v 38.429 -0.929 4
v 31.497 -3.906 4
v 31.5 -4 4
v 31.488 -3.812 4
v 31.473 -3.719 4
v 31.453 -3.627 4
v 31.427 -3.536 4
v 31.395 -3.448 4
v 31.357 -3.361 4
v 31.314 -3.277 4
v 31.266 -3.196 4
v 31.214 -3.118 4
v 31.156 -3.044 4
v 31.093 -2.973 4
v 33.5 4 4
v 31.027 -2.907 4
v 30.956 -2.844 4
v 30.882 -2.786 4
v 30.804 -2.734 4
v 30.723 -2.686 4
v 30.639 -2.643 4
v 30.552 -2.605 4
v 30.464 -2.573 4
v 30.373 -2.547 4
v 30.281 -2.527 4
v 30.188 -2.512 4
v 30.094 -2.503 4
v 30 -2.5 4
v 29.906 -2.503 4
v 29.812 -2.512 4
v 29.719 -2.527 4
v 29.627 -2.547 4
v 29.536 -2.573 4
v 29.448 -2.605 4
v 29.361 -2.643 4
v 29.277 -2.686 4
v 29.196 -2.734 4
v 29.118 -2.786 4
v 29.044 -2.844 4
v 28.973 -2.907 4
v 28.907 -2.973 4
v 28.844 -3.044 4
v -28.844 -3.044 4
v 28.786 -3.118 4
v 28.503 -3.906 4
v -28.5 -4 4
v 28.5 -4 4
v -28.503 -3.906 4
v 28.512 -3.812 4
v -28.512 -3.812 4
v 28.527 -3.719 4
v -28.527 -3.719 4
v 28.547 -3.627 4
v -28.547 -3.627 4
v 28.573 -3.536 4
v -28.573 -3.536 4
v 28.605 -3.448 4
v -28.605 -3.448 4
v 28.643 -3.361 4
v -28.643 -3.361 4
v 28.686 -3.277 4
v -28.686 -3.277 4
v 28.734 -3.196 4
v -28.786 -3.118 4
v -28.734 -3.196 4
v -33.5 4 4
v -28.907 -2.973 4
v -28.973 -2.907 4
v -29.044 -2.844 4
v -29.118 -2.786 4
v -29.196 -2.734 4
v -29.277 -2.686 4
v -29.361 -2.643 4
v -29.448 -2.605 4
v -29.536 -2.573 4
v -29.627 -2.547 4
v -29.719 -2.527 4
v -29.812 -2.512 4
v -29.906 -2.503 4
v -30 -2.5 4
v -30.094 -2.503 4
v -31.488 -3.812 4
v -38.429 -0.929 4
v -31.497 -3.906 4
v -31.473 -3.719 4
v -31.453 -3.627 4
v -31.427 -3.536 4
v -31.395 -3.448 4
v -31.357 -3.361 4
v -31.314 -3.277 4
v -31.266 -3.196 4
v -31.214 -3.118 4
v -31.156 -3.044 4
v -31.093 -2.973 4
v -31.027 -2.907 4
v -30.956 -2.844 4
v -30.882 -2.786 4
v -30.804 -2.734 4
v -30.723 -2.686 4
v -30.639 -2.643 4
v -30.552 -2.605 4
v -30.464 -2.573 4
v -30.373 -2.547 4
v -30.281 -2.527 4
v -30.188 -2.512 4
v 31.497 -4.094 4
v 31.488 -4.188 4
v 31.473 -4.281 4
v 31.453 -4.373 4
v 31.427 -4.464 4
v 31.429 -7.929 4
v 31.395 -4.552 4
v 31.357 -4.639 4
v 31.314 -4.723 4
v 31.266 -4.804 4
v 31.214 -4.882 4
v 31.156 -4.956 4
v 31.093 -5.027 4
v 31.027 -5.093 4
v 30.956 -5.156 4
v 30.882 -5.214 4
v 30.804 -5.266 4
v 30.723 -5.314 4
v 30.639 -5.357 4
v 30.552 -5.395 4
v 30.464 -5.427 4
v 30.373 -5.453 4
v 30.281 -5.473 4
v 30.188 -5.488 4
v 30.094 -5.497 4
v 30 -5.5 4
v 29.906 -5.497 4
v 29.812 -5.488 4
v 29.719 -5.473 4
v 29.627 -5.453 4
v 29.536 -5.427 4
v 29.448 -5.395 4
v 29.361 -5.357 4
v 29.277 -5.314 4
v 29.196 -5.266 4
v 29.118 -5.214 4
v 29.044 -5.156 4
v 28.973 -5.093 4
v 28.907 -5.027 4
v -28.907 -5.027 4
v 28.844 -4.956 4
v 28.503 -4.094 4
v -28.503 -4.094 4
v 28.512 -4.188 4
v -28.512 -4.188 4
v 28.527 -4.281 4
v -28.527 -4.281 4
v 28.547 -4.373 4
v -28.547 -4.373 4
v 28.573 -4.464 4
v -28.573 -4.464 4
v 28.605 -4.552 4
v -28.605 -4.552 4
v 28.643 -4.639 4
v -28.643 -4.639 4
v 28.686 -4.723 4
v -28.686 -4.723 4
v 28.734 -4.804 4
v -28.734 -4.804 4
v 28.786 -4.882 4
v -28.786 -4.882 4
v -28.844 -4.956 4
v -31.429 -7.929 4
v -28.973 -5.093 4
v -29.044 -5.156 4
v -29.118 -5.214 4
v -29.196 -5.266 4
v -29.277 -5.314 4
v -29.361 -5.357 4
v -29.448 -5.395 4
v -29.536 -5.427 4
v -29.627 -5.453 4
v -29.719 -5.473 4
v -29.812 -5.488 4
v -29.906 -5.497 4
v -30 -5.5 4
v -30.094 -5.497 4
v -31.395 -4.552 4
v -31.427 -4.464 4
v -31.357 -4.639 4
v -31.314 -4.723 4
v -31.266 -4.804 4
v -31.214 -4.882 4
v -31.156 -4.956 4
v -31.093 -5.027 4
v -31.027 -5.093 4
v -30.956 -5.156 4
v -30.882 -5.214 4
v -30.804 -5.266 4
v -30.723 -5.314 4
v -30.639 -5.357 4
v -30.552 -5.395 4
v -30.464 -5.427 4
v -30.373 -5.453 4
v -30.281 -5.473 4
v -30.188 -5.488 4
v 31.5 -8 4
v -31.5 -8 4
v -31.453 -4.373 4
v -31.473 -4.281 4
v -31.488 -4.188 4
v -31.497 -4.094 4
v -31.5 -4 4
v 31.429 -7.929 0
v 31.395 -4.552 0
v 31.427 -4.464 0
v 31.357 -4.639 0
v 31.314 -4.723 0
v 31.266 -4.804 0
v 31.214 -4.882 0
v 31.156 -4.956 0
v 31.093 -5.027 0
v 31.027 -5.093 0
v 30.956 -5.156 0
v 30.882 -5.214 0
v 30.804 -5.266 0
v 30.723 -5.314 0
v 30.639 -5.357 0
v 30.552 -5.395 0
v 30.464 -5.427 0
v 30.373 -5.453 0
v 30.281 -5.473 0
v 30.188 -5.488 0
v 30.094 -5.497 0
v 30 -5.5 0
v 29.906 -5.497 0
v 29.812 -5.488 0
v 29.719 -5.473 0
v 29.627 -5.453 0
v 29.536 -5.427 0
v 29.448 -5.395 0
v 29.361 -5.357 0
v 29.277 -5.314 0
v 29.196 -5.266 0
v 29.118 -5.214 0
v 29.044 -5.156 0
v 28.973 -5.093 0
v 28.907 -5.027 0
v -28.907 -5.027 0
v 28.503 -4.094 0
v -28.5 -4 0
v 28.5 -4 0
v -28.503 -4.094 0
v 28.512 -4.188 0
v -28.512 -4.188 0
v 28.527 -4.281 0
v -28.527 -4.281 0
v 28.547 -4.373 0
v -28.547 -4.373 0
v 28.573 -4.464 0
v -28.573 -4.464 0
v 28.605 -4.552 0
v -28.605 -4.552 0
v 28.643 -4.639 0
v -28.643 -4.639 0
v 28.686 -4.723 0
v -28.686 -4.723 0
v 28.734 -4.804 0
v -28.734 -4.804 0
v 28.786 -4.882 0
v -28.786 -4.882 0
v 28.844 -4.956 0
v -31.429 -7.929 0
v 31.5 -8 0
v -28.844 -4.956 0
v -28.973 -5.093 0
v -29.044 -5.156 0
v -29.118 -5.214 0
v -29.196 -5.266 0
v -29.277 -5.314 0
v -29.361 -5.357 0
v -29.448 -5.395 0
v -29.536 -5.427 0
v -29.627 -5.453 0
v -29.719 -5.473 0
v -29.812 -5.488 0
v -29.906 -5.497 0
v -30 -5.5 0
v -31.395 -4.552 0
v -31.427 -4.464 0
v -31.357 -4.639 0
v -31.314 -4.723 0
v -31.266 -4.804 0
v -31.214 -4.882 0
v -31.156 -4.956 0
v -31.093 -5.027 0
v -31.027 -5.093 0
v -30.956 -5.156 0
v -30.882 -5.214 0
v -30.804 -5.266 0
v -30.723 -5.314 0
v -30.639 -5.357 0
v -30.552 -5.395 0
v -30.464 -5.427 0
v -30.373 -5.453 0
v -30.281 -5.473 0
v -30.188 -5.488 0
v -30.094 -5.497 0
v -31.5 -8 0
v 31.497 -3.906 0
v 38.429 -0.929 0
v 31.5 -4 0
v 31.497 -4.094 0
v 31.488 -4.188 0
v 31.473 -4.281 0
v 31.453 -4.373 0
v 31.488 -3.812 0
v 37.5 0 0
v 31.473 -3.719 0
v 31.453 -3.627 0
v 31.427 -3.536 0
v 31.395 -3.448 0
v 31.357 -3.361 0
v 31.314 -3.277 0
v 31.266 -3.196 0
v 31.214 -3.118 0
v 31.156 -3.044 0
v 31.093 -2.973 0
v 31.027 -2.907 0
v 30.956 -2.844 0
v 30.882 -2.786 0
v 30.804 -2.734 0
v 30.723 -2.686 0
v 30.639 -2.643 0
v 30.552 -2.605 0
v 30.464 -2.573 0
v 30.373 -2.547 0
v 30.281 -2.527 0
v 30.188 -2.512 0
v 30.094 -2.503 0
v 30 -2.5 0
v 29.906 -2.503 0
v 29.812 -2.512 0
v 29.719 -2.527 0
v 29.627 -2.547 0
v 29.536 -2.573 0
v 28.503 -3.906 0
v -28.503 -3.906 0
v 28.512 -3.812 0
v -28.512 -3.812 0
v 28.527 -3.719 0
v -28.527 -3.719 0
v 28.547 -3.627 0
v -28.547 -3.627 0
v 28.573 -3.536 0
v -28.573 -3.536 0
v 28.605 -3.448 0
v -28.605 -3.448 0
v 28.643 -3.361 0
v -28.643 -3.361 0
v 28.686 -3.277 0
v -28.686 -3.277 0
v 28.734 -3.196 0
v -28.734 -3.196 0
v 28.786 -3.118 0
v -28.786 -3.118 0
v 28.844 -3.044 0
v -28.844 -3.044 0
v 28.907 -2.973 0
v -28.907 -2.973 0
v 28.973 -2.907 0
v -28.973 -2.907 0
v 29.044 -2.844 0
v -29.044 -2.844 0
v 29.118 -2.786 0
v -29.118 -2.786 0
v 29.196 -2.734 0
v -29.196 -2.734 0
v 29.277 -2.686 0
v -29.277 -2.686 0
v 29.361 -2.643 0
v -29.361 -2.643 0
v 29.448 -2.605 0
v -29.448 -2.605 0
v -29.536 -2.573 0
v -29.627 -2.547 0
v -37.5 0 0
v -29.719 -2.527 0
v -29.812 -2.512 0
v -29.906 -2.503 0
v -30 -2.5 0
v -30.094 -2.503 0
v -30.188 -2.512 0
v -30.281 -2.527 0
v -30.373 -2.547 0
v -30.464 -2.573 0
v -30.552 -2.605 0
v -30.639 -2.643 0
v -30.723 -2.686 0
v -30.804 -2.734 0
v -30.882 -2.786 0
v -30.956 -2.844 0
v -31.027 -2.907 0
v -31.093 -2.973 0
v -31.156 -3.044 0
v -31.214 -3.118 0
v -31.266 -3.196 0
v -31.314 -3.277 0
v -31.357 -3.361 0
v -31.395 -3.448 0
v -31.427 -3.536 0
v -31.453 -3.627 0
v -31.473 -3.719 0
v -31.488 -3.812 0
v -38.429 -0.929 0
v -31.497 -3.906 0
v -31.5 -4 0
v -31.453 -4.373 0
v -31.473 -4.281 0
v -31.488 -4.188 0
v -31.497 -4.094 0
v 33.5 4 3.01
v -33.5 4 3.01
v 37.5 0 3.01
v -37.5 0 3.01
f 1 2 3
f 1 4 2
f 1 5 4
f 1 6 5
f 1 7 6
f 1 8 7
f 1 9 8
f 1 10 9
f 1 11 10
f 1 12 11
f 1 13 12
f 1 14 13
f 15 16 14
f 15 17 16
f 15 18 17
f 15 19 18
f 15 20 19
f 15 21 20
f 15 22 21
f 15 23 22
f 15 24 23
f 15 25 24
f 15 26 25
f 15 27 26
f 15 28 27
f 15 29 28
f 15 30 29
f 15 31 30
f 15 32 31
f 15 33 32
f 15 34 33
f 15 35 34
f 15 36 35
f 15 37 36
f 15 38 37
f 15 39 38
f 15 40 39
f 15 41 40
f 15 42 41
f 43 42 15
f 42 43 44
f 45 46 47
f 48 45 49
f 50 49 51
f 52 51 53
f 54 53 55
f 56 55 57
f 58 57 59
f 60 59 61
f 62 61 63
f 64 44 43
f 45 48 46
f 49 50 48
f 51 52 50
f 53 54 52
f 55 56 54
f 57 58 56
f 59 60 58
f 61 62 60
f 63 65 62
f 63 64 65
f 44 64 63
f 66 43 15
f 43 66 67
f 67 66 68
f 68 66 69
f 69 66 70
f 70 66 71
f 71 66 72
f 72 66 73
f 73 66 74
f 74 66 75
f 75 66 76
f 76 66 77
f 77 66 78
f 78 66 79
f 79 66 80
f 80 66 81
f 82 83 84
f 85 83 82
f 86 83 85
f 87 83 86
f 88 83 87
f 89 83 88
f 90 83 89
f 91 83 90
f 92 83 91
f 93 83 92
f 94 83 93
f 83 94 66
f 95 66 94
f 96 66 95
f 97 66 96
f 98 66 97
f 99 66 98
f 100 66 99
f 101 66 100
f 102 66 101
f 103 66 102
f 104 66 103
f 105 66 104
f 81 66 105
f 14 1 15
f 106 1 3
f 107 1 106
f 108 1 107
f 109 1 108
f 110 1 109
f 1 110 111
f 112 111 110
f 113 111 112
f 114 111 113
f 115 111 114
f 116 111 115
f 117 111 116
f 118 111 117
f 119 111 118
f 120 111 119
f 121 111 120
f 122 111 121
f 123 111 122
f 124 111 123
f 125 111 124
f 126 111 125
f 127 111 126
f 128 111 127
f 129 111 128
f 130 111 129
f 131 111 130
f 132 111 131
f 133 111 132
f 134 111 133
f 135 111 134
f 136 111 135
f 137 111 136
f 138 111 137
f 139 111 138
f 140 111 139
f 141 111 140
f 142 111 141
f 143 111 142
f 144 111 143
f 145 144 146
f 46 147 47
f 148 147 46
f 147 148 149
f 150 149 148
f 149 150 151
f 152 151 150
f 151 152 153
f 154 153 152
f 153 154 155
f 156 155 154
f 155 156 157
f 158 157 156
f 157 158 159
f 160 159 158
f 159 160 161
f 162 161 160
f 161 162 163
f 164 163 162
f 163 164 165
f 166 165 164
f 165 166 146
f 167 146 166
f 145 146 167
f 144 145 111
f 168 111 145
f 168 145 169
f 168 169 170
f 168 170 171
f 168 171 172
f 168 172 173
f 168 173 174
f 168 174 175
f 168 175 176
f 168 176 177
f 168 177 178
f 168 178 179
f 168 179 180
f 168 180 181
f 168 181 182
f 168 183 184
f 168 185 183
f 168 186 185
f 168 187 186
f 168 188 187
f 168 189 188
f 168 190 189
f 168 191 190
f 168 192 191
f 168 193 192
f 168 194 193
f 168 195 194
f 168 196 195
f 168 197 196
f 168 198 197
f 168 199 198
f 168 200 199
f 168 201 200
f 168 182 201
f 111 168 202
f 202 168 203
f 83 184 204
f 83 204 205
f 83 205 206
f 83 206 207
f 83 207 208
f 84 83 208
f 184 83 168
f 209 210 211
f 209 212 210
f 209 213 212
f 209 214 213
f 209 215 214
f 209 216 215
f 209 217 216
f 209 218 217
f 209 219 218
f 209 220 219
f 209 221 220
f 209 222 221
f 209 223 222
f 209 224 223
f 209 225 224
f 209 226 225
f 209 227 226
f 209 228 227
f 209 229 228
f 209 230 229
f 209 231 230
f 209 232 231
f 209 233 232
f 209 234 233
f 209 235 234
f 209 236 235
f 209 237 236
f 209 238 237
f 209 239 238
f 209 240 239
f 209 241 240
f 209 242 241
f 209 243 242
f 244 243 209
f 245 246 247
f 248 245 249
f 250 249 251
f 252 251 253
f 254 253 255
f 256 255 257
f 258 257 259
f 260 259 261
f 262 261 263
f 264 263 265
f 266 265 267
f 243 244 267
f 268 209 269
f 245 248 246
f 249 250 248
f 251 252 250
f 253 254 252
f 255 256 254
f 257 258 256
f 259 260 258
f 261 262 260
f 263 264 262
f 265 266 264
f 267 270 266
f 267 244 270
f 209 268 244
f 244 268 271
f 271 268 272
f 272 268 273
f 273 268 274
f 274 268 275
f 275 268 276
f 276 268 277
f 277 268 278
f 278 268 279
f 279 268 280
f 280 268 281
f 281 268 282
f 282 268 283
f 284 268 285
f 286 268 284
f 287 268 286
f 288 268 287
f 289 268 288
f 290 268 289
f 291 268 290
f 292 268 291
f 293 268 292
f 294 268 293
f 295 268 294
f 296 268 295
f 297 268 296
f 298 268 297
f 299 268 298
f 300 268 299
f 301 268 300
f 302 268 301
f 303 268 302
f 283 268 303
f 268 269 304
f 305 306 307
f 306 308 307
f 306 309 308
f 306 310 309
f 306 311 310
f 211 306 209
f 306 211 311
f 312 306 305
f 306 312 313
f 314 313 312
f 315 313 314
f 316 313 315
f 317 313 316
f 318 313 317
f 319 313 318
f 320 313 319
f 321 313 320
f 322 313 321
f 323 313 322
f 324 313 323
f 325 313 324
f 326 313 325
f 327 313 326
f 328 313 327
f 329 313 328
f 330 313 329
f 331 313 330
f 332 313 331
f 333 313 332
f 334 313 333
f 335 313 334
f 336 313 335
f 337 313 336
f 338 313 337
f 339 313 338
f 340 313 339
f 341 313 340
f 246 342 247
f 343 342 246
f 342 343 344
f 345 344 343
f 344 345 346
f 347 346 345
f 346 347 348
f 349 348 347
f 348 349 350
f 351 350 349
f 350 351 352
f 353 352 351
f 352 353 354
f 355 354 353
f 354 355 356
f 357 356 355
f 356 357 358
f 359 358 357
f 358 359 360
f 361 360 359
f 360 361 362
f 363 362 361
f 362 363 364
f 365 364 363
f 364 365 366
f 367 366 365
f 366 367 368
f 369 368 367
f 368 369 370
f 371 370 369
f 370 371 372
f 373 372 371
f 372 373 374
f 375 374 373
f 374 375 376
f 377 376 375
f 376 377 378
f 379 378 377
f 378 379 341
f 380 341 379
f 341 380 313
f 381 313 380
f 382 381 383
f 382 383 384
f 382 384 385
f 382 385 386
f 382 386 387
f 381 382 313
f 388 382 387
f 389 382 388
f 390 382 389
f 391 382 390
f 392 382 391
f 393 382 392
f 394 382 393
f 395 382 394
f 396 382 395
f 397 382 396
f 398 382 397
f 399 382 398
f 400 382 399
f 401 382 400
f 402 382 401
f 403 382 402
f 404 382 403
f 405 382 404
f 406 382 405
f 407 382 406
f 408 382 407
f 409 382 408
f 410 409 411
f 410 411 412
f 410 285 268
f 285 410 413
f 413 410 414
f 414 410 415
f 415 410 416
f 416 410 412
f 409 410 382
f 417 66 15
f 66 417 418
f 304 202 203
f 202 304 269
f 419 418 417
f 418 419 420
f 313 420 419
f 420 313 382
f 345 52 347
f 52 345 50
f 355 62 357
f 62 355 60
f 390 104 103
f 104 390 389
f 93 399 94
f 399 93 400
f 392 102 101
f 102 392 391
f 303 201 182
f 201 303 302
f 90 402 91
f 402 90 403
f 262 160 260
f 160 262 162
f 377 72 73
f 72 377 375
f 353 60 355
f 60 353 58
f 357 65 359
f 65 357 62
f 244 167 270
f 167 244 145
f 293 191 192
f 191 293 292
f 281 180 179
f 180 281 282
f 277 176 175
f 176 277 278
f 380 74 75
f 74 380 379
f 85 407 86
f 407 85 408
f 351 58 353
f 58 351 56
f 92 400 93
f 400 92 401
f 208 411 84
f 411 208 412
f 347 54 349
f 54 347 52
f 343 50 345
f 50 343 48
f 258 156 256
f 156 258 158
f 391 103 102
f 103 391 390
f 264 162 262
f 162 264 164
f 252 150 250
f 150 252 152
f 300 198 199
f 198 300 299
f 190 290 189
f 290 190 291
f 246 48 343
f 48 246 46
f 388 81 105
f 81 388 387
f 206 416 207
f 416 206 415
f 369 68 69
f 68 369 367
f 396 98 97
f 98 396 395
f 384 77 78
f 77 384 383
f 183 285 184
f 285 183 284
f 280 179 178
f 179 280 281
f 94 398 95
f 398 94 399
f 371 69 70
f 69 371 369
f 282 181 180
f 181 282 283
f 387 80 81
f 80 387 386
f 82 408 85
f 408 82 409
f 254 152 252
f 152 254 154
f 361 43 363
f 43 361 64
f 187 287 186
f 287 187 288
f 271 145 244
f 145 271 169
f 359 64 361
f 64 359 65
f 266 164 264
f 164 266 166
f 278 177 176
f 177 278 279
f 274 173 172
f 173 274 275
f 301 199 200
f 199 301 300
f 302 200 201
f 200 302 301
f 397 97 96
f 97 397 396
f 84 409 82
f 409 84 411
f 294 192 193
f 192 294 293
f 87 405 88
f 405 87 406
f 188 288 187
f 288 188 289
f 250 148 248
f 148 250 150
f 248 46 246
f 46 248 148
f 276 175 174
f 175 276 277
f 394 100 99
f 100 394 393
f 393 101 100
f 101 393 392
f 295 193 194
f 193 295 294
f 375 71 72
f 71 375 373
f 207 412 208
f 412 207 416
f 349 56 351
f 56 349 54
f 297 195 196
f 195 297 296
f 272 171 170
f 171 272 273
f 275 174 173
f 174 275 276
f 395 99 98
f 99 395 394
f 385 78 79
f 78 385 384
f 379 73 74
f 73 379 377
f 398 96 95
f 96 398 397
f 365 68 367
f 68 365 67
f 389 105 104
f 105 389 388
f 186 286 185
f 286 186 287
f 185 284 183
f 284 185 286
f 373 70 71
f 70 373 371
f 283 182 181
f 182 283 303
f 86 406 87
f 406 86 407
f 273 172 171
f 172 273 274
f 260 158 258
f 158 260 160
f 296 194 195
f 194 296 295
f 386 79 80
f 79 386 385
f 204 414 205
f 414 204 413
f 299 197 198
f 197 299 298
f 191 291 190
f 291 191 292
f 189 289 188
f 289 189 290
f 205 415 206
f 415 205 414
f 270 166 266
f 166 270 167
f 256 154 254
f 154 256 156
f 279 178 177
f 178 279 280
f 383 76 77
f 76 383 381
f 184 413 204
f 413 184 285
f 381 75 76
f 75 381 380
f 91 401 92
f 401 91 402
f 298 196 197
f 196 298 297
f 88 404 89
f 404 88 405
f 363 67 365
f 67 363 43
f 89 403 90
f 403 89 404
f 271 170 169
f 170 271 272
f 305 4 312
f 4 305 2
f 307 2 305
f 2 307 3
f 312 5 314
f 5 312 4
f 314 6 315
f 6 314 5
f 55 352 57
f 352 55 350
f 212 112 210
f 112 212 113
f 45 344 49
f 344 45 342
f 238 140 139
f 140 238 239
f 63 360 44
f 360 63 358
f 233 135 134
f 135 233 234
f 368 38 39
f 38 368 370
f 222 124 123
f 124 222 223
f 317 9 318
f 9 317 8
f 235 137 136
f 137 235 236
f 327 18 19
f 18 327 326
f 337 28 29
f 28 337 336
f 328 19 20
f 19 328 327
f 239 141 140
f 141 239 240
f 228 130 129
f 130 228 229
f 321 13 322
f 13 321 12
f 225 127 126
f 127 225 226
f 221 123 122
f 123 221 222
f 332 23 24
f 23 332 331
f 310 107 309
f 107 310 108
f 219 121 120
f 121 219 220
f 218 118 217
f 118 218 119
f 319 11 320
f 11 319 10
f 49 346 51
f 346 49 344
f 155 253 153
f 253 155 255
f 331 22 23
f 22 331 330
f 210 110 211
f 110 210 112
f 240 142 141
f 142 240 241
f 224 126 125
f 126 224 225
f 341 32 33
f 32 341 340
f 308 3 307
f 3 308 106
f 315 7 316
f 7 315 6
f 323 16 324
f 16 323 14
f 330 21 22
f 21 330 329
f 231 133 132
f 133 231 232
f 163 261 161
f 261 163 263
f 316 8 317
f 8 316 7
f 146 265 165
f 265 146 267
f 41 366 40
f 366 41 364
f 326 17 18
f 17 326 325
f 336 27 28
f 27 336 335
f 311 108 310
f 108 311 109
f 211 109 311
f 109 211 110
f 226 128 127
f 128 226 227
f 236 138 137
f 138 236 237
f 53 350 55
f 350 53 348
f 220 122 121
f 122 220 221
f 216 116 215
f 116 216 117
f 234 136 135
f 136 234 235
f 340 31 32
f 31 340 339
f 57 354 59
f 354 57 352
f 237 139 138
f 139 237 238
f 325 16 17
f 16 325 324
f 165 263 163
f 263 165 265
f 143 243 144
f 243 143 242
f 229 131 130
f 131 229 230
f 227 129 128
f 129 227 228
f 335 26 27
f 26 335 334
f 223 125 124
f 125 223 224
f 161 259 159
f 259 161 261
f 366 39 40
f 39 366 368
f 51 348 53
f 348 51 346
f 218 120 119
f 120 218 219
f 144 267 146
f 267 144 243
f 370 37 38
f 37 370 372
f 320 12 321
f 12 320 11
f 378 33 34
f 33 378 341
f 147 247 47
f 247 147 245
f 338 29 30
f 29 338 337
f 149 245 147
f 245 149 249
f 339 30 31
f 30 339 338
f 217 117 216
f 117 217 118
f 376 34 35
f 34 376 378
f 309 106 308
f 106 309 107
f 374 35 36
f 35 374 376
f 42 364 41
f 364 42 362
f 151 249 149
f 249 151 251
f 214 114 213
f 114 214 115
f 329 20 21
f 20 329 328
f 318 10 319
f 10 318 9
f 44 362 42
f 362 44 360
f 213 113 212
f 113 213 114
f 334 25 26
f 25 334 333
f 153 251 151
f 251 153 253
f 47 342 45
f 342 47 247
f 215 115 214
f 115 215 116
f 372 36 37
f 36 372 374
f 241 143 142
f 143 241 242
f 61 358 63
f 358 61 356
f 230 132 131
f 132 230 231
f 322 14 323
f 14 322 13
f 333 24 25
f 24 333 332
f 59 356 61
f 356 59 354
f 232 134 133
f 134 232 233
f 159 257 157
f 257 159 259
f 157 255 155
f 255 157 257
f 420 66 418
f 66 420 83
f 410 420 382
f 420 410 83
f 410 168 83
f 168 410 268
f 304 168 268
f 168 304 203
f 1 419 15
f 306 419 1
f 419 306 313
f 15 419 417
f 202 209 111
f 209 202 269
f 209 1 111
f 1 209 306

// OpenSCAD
//
// Filter Slot for Formatt Hitech 67mm Filter
// Copyright (C) 2021 Uwe Glässner
//

// slot lengths (mm)
l = 77; // total length
l1 = 20;  // length until curve 
// slot widths (mm)
w1 = 8;
w2 = 0.0;
w3 = 4.0;
w  = w1+w2+w3;
// slot height (mm)
h1 = 1.0; // curvature thickness
cr = 80; // curvature radius
of = 0.6; // curvature offset for 2mm firecrest filters (instead of 1.4mm Resin) 
h = 4; // total height

D = 0.01; // generic overlap of parts.

module loch(posx,posy){
    union(){
       translate([posx, posy,-D]) cylinder(d=3, h=h+2*D, $fn=100);
    }
}


 difference(){
    // slot
    translate([-l/2,-w1,0]) cube([l,w,h]);
    // carve out middle slot 
    translate([-l/2+l1+D,0,-D]) cube([l-2*l1,w2,h+2*D]);
    // carve out sides
    translate([-l/2-D,0,-D]) cube([l+2*D,w2+w3+D,h-h1+2*D]);

     
    // screw holes
    loch(-l/2+8.5, -8+4.0); 
    loch( l/2-8.5, -8+4.0); 
     
    // remove corners 
    translate([-l/2,-1,-D]) rotate([0,0,45]) cube([10,10,h+2*D]);
    translate([-l/2,-15,-D]) rotate([0,0,45]) cube([10,10,h+2*D]);
    translate([l/2,-1,-D]) rotate([0,0,45]) cube([10,10,h+2*D]);
    translate([l/2,-15,-D]) rotate([0,0,45]) cube([10,10,h+2*D]);
}
